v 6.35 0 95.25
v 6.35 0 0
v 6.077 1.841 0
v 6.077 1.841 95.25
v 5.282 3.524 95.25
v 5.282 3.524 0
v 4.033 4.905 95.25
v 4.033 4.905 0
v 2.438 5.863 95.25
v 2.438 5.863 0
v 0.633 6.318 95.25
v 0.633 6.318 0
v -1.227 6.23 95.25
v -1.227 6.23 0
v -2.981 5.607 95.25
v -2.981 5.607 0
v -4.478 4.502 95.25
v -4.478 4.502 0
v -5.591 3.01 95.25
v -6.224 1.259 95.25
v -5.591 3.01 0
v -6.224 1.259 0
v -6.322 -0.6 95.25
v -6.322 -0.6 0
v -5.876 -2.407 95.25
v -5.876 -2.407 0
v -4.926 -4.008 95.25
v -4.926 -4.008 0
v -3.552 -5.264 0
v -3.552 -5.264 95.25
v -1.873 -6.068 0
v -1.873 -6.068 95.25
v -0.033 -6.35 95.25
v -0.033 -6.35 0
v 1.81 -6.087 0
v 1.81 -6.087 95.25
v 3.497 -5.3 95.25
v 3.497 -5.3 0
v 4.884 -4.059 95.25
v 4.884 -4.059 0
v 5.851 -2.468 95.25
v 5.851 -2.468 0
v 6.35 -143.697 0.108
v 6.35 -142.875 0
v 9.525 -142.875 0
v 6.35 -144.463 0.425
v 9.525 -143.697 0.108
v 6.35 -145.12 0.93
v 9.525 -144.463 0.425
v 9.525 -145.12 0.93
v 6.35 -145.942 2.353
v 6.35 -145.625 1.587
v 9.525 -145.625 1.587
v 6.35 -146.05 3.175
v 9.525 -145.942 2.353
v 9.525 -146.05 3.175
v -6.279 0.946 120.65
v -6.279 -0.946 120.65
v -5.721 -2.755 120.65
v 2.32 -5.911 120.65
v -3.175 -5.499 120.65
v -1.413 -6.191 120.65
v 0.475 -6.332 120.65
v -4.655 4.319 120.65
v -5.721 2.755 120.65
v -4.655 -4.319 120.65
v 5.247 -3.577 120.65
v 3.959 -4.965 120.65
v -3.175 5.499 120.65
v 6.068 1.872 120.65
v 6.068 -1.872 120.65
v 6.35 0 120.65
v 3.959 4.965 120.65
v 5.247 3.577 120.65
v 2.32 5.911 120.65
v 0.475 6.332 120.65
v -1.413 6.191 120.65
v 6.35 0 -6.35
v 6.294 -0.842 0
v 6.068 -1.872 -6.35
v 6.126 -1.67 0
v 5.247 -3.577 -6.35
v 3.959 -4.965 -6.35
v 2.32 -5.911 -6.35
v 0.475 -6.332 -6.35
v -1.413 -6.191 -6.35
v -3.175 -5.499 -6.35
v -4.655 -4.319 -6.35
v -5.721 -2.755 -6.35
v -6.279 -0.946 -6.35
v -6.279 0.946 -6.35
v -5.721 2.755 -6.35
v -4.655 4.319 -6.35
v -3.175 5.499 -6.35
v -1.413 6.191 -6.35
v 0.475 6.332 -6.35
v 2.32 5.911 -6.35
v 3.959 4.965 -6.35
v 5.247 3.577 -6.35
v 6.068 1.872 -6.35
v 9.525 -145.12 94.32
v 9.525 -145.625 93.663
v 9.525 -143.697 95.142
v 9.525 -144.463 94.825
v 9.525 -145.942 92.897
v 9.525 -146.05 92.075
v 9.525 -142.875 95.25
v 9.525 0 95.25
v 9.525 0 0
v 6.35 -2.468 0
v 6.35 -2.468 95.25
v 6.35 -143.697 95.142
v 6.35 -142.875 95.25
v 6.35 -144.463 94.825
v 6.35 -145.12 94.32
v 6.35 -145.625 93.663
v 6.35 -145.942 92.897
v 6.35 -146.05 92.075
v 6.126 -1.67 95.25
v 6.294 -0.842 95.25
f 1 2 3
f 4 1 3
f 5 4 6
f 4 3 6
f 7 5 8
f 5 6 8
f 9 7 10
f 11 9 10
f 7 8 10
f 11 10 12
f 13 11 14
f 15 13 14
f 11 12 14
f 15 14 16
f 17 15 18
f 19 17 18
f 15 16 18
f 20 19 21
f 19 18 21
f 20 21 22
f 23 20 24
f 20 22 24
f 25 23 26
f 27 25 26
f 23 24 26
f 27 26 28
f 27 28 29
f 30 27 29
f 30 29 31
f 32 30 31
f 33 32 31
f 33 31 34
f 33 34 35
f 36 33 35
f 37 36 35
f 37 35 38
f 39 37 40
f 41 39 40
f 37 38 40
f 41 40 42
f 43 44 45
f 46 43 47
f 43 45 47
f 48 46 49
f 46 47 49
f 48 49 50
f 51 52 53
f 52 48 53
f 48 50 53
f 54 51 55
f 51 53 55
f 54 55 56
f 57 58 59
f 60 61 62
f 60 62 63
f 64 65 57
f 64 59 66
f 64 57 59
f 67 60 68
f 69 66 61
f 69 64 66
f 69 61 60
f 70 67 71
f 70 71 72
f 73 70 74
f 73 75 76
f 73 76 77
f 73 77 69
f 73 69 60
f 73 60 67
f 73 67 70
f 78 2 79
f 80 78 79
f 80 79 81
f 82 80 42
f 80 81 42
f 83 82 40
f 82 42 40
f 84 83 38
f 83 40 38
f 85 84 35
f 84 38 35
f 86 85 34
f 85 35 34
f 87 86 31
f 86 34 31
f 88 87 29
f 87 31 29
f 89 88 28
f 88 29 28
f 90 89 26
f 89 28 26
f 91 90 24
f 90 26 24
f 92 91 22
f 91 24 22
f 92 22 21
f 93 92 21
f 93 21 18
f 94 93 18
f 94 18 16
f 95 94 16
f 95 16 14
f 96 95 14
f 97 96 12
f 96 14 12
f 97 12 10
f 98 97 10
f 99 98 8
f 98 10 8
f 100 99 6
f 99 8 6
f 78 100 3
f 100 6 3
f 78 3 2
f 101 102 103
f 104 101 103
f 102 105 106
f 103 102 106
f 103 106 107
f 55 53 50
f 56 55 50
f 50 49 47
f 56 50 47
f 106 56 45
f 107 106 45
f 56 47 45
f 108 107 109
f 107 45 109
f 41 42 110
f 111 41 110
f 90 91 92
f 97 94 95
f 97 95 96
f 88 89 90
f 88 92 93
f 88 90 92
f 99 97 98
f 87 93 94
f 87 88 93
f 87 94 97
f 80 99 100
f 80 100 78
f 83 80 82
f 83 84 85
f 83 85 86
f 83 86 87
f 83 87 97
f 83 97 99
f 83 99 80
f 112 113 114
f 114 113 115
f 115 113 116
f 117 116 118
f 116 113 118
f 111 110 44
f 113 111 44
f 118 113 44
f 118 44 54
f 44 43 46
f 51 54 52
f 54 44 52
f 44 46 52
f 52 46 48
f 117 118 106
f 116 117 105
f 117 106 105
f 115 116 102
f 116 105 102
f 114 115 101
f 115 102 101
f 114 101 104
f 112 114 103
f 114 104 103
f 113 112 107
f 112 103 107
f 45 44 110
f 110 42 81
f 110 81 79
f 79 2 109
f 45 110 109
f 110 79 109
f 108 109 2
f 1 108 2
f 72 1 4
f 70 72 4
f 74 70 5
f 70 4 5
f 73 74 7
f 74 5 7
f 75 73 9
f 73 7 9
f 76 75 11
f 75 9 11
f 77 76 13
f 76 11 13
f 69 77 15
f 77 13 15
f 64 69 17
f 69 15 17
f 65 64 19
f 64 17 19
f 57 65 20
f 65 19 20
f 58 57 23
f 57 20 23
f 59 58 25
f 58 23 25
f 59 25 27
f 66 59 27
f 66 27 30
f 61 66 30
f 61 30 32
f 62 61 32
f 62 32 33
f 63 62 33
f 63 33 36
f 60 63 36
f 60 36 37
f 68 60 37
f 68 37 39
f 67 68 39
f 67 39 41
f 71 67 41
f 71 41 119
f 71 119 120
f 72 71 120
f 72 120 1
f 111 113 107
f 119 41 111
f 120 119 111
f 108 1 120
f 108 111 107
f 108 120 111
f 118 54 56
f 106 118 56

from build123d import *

# Parameters (mm, degrees)
F1_DEPTH = 95.25
F2_R     = 6.35
F3_DEPTH = 25.4
F4_R     = 6.35
F5_DEPTH = 6.35
F7_DEPTH = 25.4


with BuildPart() as f1:
    # F0 (on Top) → F1 (new body)
    with BuildSketch(Plane.XY):
        with BuildLine():
            Line((9.525, 0), (6.35, 0))
            ThreePointArc((6.35, 0), (-6.2239381909, 1.2590049228), (5.8507579856, -2.4680216762))
            Line((5.8507579856, -2.4680216762), (6.35, -2.4680216762))
            Line((6.35, -2.4680216762), (6.35, -146.05))
            Line((6.35, -146.05), (9.525, -146.05))
            Line((9.525, -146.05), (9.525, 0))
        make_face()
    extrude(amount=F1_DEPTH)

    # F2 (on face) → F3 (join)
    with BuildSketch(Plane.XY.offset(95.25)):
        Circle(F2_R)
    extrude(amount=F3_DEPTH)

    # F4 (on face) → F5 (join)
    with BuildSketch(Plane(origin=(0, 0, 0), x_dir=(1, 0, 0), z_dir=(0, 0, -1))):
        Circle(F4_R)
    extrude(amount=F5_DEPTH)

    # F6 (on face) → F7 (cut)
    with BuildSketch(Plane.YZ.offset(9.525)):
        with BuildLine():
            ThreePointArc((-146.05, 92.075), (-145.1200640303, 94.3200640303), (-142.875, 95.25))
            Line((-142.875, 95.25), (-146.05, 95.25))
            Line((-146.05, 95.25), (-146.05, 92.075))
        make_face()
        with BuildLine():
            ThreePointArc((-142.875, 0), (-145.1200640303, 0.9299359697), (-146.05, 3.175))
            Line((-146.05, 3.175), (-146.05, 0))
            Line((-146.05, 0), (-142.875, 0))
        make_face()
    extrude(amount=-F7_DEPTH, mode=Mode.SUBTRACT)


solid = f1.part
